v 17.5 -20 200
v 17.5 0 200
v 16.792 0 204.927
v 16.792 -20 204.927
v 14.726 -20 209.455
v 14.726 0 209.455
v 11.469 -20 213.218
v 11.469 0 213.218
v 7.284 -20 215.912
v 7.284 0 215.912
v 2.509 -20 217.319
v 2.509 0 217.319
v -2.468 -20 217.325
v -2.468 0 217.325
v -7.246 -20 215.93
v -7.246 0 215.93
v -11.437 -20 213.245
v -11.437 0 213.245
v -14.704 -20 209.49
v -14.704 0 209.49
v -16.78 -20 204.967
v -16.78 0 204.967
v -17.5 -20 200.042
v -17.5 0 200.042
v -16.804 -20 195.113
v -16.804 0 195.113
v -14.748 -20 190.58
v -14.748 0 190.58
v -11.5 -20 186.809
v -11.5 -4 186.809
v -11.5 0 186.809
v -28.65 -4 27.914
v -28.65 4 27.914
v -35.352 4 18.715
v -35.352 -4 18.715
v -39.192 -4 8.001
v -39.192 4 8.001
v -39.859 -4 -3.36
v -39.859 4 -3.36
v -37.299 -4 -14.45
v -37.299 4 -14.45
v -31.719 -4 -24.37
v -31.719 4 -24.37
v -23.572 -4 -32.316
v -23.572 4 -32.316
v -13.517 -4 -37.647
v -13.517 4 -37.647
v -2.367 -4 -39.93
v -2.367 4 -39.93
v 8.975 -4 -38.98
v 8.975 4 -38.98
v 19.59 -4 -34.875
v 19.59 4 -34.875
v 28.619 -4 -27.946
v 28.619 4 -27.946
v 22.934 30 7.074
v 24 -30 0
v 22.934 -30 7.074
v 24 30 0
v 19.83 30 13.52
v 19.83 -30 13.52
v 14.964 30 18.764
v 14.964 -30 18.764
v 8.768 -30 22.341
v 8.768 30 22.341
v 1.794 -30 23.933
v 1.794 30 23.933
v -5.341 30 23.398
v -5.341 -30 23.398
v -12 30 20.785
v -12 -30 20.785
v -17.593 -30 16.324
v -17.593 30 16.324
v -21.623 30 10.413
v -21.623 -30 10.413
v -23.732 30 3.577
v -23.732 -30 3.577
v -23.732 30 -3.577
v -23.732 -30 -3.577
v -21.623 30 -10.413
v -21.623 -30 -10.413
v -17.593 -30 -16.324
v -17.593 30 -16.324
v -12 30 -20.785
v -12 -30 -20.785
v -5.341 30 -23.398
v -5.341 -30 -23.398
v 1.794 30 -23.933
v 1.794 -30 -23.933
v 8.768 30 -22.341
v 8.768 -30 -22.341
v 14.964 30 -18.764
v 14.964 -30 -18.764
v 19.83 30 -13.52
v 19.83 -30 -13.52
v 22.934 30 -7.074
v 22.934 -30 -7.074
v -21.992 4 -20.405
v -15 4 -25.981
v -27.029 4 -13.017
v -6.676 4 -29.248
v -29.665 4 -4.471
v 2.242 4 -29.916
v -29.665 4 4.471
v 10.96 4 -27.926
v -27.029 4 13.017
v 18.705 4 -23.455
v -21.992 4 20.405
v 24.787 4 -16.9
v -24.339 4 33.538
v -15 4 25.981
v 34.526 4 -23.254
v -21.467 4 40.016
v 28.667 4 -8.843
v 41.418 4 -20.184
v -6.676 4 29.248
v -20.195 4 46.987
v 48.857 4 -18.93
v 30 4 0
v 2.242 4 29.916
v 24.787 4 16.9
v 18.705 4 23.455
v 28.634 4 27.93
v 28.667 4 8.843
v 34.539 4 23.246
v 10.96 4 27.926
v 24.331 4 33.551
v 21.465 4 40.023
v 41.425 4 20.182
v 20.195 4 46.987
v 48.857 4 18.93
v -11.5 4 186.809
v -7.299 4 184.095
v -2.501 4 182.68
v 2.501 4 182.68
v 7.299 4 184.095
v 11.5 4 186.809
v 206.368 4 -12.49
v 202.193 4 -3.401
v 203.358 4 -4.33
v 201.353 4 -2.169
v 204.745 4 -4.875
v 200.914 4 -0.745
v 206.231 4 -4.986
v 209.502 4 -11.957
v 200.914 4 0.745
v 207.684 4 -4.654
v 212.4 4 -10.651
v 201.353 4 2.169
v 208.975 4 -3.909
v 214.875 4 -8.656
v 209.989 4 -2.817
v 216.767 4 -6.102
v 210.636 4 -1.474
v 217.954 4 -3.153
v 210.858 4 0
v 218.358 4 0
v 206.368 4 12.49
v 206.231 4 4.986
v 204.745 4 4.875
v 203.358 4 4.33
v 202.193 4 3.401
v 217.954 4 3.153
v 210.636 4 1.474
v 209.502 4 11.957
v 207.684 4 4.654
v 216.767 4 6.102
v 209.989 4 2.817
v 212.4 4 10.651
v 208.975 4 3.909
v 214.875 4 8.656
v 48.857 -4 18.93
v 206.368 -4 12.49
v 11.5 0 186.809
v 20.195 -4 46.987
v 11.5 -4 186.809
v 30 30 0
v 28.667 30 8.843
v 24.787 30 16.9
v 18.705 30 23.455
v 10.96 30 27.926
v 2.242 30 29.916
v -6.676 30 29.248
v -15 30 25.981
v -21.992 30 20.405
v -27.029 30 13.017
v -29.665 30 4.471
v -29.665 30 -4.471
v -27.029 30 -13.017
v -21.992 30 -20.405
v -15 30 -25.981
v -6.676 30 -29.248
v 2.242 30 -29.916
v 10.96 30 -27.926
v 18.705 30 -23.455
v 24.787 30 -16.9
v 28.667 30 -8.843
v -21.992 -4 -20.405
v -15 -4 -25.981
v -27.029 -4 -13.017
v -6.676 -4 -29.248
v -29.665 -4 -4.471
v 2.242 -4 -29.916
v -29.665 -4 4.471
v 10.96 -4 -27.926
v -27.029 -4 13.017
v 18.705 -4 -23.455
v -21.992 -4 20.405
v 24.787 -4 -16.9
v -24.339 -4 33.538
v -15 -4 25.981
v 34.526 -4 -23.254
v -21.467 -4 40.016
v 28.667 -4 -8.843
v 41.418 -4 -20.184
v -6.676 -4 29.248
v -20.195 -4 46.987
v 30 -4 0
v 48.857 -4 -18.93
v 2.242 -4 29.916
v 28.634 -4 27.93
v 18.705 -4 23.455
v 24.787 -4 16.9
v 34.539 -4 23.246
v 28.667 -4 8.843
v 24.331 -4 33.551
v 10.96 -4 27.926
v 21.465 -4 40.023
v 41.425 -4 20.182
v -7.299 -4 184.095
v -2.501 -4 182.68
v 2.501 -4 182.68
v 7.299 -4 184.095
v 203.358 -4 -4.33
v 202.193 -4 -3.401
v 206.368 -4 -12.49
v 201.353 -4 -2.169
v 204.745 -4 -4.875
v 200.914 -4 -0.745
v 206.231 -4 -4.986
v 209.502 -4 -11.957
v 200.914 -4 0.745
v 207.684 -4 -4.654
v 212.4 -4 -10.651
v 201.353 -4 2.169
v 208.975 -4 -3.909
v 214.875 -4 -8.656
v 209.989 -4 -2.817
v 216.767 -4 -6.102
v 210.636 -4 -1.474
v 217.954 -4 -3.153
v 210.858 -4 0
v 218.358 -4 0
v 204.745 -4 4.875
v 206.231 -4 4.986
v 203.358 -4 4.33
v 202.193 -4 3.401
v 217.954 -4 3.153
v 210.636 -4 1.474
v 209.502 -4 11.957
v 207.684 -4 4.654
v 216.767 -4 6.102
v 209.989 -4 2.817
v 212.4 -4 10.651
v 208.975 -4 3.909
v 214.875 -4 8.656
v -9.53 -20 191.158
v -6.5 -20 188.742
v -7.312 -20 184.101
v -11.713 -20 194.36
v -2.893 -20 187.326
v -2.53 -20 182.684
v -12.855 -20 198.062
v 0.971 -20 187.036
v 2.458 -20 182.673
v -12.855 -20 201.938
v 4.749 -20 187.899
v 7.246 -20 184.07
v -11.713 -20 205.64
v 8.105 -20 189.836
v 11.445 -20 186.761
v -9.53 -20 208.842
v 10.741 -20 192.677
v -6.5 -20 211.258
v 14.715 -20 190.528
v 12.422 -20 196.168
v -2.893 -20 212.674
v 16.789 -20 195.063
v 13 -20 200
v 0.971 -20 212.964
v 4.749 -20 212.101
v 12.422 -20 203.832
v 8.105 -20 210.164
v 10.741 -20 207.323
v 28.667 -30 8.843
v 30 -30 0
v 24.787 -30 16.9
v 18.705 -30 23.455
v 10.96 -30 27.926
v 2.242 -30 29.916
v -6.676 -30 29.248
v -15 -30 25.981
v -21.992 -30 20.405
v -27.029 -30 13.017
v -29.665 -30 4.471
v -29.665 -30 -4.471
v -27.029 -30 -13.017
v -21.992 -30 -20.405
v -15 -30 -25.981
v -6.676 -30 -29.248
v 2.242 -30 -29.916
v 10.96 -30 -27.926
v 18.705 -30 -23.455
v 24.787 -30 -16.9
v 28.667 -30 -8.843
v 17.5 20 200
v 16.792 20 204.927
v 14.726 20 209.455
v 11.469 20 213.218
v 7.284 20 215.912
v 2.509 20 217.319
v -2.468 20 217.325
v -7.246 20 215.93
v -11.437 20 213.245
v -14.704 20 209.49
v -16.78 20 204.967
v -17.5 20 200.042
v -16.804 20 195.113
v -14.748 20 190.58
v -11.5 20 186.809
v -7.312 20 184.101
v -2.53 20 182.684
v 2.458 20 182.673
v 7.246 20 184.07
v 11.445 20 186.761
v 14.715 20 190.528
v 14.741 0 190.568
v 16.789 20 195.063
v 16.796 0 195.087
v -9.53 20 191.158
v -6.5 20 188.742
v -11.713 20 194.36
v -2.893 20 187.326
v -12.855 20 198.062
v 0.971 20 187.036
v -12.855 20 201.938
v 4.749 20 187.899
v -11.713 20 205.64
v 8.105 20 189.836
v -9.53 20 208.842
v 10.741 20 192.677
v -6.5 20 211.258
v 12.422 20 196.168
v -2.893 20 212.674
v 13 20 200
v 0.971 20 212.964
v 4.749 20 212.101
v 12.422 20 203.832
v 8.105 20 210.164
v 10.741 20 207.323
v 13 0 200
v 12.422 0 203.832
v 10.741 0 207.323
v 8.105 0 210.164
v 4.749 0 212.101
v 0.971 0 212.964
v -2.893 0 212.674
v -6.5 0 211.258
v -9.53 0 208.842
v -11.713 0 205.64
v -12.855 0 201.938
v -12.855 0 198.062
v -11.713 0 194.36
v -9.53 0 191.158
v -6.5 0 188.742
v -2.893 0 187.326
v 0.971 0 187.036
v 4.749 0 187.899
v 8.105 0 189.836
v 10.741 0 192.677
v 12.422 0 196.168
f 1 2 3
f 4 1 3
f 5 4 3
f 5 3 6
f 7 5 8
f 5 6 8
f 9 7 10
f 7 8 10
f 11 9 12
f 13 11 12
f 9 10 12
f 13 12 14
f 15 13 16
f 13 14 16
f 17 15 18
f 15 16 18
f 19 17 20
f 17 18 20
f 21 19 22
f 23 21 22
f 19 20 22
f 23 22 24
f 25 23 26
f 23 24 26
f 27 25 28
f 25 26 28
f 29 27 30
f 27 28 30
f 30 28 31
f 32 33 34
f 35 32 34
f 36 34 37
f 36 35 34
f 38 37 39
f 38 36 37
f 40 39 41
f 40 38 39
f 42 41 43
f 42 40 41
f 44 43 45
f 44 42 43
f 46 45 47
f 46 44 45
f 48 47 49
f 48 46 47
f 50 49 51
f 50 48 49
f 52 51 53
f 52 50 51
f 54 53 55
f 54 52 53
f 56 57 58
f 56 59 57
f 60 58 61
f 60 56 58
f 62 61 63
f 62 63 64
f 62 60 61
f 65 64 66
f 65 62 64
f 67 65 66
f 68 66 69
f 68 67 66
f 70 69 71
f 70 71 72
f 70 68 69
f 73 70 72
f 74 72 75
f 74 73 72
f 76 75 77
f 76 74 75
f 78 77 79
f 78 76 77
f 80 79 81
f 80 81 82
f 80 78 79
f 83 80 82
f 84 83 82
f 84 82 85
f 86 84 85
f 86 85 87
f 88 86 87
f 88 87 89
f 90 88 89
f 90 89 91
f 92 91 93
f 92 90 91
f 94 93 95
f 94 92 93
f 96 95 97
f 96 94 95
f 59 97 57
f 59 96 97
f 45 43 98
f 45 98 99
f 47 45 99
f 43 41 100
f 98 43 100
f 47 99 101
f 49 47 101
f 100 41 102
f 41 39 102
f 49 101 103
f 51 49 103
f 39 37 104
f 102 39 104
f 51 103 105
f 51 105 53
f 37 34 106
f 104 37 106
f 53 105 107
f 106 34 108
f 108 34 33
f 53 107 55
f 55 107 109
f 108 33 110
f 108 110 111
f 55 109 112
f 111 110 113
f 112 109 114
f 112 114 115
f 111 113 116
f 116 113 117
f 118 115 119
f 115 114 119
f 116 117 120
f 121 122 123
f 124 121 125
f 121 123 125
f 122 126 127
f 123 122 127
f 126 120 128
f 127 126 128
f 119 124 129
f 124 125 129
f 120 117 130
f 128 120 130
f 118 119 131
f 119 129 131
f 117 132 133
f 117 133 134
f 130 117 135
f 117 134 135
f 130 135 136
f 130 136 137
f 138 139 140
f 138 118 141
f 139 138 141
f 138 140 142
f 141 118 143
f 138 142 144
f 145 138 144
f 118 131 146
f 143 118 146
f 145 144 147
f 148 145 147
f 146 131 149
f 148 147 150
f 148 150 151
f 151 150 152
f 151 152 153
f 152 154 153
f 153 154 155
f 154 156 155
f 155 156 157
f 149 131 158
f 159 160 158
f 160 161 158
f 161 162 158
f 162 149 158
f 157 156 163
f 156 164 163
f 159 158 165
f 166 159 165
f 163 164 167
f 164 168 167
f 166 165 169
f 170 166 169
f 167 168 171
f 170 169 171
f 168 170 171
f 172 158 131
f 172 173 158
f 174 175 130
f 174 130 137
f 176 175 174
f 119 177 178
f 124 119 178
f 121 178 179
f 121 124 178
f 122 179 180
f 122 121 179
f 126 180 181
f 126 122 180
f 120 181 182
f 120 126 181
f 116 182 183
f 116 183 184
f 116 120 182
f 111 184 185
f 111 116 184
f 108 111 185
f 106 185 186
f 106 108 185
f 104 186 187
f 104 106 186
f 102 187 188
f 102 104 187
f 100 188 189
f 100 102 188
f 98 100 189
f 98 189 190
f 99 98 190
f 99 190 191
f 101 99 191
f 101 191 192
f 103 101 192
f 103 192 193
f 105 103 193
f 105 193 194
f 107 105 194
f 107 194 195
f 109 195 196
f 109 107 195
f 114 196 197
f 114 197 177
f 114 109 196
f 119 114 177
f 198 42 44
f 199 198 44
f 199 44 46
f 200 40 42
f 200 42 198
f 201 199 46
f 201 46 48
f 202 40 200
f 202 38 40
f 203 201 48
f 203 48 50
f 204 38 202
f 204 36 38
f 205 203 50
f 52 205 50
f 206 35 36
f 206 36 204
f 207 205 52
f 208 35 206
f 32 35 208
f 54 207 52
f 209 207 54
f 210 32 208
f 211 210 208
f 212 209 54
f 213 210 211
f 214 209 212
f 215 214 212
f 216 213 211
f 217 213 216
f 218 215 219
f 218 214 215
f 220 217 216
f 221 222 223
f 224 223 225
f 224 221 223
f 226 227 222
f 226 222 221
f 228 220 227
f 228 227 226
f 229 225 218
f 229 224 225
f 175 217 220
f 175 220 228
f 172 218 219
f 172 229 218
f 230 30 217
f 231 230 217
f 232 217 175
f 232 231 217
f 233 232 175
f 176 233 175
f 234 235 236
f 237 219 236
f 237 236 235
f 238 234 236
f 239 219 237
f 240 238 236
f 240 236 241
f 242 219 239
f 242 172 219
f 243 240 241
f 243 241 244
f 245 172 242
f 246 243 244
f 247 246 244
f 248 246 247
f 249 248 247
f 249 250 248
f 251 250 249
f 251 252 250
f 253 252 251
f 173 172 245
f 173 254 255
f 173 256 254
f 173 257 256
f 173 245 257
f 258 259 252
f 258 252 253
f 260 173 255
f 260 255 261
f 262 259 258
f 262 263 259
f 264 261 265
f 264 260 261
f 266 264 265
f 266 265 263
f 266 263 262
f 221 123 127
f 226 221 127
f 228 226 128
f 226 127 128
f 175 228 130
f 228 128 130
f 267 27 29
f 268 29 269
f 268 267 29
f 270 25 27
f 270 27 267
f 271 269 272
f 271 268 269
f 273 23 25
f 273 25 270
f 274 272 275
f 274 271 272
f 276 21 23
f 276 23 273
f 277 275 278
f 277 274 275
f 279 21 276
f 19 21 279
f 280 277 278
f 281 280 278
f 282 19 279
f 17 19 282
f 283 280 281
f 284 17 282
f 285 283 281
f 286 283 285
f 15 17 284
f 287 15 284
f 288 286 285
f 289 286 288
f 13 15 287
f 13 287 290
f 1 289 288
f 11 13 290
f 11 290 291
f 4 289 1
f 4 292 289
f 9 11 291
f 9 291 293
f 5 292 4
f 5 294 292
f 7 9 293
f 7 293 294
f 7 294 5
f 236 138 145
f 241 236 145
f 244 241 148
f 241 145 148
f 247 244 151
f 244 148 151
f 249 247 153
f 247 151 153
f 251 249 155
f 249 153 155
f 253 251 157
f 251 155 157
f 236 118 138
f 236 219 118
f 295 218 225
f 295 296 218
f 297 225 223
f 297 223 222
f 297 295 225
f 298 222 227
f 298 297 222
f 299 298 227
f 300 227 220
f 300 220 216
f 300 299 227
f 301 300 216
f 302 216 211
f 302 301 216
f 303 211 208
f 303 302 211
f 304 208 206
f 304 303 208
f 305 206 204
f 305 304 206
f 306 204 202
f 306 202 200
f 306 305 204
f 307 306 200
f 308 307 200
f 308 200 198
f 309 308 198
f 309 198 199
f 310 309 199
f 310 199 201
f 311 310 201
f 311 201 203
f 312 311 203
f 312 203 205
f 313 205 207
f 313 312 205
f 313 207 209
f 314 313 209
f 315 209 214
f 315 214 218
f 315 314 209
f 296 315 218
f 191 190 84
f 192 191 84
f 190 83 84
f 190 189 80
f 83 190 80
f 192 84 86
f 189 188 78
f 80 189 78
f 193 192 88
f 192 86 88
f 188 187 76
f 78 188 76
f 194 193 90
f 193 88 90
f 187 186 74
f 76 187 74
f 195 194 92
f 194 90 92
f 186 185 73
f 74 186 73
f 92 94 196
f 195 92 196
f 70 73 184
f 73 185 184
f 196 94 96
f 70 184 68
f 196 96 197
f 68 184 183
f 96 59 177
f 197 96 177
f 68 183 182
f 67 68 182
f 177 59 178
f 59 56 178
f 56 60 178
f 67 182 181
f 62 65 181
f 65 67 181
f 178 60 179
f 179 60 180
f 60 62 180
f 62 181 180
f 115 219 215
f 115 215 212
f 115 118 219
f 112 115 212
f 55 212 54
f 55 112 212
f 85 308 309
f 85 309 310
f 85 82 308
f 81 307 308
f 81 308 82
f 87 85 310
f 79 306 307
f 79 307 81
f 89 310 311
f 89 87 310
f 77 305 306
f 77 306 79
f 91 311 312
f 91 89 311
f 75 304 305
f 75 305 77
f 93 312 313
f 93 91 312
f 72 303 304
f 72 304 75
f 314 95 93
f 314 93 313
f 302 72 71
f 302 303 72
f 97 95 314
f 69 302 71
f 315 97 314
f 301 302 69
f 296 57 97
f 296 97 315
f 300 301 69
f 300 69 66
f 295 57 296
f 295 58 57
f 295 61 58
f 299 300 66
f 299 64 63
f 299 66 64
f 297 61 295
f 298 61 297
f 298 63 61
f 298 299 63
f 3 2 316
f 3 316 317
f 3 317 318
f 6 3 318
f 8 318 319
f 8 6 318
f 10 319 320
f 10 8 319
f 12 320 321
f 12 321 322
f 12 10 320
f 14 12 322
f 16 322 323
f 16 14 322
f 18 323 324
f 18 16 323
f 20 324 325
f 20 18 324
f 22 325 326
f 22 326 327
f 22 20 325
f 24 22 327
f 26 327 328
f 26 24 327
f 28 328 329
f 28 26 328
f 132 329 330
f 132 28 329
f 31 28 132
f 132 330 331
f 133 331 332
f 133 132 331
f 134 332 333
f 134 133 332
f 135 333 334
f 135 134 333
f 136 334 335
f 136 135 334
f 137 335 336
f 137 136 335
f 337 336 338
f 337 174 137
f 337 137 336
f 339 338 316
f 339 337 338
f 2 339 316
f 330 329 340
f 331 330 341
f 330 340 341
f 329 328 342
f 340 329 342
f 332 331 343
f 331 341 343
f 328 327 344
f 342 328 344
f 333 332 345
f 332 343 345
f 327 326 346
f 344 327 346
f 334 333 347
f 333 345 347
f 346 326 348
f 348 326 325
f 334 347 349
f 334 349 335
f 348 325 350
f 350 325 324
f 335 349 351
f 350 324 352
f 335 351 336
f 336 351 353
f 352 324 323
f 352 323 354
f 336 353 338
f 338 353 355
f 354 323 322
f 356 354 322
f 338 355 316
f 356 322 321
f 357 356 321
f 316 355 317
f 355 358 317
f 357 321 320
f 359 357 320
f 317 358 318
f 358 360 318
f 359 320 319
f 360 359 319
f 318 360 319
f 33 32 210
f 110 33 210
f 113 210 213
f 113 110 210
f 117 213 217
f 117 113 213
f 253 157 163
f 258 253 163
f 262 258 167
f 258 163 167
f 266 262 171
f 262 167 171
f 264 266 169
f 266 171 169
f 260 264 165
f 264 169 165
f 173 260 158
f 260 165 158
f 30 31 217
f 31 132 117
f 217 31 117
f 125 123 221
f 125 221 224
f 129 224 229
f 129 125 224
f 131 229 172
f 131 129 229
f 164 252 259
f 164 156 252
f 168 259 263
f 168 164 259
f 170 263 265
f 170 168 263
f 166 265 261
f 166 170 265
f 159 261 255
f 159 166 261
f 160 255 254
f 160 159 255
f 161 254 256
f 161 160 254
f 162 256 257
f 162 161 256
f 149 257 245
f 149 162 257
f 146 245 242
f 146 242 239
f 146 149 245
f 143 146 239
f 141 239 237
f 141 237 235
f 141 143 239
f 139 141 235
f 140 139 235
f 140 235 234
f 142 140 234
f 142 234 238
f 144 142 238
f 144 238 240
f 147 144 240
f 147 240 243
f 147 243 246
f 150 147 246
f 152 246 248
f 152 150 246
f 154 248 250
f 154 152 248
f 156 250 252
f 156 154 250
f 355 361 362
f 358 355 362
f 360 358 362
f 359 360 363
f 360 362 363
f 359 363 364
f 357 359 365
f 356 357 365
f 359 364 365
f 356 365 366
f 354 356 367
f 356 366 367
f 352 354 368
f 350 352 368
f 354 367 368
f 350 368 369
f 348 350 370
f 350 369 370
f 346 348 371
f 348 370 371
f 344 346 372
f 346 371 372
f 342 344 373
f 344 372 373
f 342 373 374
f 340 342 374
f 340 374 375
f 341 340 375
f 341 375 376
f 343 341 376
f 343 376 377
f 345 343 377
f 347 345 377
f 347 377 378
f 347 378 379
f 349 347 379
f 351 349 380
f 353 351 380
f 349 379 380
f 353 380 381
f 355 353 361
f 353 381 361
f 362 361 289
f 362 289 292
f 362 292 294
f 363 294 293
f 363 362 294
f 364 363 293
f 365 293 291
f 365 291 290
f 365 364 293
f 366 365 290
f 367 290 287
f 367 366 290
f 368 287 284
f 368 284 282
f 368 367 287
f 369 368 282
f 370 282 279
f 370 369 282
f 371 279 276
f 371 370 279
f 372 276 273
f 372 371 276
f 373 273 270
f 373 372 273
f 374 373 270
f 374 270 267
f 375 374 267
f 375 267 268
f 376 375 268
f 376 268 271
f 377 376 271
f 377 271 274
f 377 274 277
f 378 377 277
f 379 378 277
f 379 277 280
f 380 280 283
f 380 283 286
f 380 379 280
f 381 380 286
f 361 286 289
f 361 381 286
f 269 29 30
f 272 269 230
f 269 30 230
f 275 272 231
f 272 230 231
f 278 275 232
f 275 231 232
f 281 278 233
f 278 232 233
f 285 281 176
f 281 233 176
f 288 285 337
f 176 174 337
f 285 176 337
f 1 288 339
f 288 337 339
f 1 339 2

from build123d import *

# Parameters (mm, degrees)
F0_R        = 30
F0_R_2      = 5
F1_DEPTH    = 4
F2_R        = 30
F3_R        = 30
F4_T1_DEPTH = 8
F5_R        = 30
F5_R_2      = 24
F6_DEPTH    = 30
F0_R_3      = 13
F7_DEPTH    = 20


# Not quite as in the source:
# - a fillet or chamfer that OpenCascade refuses, or shapes differently, is made with other operations: its cross-section is extruded or revolved along the edge and cut away or added


with BuildPart() as f1:
    # F0 (on Front) → F1 (new body, symmetric)
    with BuildSketch(Plane.XZ):
        with BuildLine():
            ThreePointArc((34.9249194702, -19.5), (38.7104428986, -10.074800772), (40, 0))
            ThreePointArc((40, 0), (38.7104428986, 10.074800772), (34.9249194702, 19.5))
            ThreePointArc((34.9249194702, 19.5), (28.892590505, 27.6625778609), (21, 34.0440890611))
            ThreePointArc((21, 34.0440890611), (0, 40), (-21, 34.0440890611))
            ThreePointArc((-21, 34.0440890611), (-27.6625778609, -28.892590505), (34.9249194702, -19.5))
        make_face()
        Circle(F0_R, mode=Mode.SUBTRACT)
        with BuildLine():
            ThreePointArc((34.9249194702, 19.5), (38.7104428986, 10.074800772), (40, 0))
            ThreePointArc((40, 0), (38.7104428986, -10.074800772), (34.9249194702, -19.5))
            Line((34.9249194702, -19.5), (206.3684774144, -12.4895628079))
            ThreePointArc((206.3684774144, -12.4895628079), (193.3577711699, 0), (206.3684774144, 12.4895628079))
            Line((206.3684774144, 12.4895628079), (34.9249194702, 19.5))
        make_face()
        with BuildLine():
            ThreePointArc((218.3577711699, 0), (214.8753603171, 8.6563898926), (206.3684774144, 12.4895628079))
            ThreePointArc((206.3684774144, 12.4895628079), (193.3577711699, 0), (206.3684774144, -12.4895628079))
            ThreePointArc((206.3684774144, -12.4895628079), (214.8753603171, -8.6563898926), (218.3577711699, 0))
        make_face()
        with Locations((205.8577711699, 0)):
            Circle(F0_R_2, mode=Mode.SUBTRACT)
        with BuildLine():
            ThreePointArc((-21, 34.0440890611), (0, 40), (21, 34.0440890611))
            Line((21, 34.0440890611), (11.5, 186.8090940417))
            ThreePointArc((11.5, 186.8090940417), (0, 182.5), (-11.5, 186.8090940417))
            Line((-11.5, 186.8090940417), (-21, 34.0440890611))
        make_face()
    extrude(amount=F1_DEPTH, both=True)

    # F2
    f2_edges = [f1.edges().sort_by_distance(p)[0] for p in [
        (-21, 0, 34.044089),
        (34.924919, 0, -19.5),
    ]]
    fillet(f2_edges, radius=F2_R)

    # F3
    f3_edges = [f1.edges().sort_by_distance(p)[0] for p in [
        (34.924919, 0, 19.5),
    ]]
    fillet(f3_edges, radius=F3_R)

    # F4: fillet of radius 30 on 1 edges, made by hand

    # F4_s2 → F4_t1 (join)
    with BuildSketch(Plane.XZ.offset(-4)):
        with BuildLine():
            ThreePointArc((28.649862751, 27.9138919599), (22.7110220839, 36.6919475661), (20.1951004828, 46.9872973509))
            Line((20.1951004828, 46.9872973509), (21, 34.0440890611))
            ThreePointArc((21, 34.0440890611), (25.0134373272, 31.2142267736), (28.649862751, 27.9138919599))
        make_face()
    extrude(amount=F4_T1_DEPTH)

    # F5 (on Front) → F6 (join, symmetric)
    with BuildSketch(Plane.XZ):
        Circle(F5_R)
        Circle(F5_R_2, mode=Mode.SUBTRACT)
    extrude(amount=F6_DEPTH, both=True)

    # F0 (on Front) → F7 (join, symmetric)
    with BuildSketch(Plane.XZ):
        with BuildLine():
            ThreePointArc((-11.5, 186.8090940417), (0, 182.5), (11.5, 186.8090940417))
            ThreePointArc((11.5, 186.8090940417), (15.9295323221, 192.7543116269), (17.5, 200))
            ThreePointArc((17.5, 200), (-7.2456883731, 215.9295323221), (-11.5, 186.8090940417))
        make_face()
        with Locations((0, 200)):
            Circle(F0_R_3, mode=Mode.SUBTRACT)
    extrude(amount=F7_DEPTH, both=True)


solid = f1.part
